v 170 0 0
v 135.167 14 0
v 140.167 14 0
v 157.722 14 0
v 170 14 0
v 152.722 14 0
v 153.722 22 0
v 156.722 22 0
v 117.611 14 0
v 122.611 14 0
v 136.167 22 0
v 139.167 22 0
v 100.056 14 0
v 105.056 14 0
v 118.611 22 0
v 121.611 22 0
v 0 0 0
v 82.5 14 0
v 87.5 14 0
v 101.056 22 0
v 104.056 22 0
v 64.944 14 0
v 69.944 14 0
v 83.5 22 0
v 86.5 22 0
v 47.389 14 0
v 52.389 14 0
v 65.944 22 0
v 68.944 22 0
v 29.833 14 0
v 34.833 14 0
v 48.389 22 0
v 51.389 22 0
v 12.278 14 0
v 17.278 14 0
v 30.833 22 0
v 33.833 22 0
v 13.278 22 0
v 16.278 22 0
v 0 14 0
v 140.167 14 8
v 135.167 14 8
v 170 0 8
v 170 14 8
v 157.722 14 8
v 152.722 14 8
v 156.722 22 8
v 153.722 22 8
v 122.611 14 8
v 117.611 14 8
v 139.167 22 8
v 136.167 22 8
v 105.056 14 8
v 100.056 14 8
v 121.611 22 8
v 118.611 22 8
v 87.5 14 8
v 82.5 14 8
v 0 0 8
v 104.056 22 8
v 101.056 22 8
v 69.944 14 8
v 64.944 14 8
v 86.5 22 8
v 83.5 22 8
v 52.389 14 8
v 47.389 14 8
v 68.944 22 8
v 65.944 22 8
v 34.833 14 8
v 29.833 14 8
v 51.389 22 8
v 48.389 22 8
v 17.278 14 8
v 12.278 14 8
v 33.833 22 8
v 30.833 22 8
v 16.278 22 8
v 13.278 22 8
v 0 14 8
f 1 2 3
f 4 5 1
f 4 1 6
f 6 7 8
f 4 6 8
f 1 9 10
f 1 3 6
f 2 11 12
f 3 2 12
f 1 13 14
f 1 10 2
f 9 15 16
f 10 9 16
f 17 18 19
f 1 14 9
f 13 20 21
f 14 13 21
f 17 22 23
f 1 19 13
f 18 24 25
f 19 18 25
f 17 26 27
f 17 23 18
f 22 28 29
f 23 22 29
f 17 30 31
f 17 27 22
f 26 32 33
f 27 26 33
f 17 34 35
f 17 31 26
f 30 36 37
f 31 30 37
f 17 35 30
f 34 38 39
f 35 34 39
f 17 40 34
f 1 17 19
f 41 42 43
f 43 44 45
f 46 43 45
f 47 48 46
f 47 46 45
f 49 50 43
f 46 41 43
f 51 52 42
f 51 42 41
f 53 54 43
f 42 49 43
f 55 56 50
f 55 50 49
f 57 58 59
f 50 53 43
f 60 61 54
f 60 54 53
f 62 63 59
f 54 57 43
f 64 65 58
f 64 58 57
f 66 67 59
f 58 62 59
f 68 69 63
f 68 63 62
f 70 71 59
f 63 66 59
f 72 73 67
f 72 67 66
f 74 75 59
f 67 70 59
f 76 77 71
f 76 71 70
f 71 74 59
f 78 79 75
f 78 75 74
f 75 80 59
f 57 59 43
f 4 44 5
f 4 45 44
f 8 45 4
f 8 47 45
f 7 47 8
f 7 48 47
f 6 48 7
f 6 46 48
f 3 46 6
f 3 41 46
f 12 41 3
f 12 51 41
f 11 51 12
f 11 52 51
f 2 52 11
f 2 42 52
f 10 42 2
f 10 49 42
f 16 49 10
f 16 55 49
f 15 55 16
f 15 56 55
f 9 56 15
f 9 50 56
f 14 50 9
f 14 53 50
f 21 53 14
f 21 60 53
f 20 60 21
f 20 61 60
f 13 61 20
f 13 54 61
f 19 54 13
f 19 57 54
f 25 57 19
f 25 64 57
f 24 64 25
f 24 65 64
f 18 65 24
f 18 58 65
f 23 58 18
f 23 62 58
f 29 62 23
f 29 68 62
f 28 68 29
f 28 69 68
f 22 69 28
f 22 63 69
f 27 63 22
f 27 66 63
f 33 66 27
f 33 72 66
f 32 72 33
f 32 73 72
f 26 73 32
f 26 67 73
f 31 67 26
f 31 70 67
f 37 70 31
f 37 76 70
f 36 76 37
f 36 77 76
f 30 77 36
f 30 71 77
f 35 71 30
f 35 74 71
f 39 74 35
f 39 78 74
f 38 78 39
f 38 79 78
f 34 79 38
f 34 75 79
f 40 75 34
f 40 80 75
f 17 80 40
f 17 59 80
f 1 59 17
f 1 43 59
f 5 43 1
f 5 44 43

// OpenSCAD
$fn = 32;

// ----------------------------------------------------------------------
// Gear rack: 9 teeth on a 170 mm bar, pitch 17.56 mm
// ----------------------------------------------------------------------

// --- parameters (mm) ---
profile_height = 8;       // extrusion height
profile_points = 40;      // points of the closed outline

profile = [[0, 0], [170, 0], [170, 14], [157.722, 14], [156.722, 22], [153.722, 22], [152.722, 14], [140.167, 14], [139.167, 22], [136.167, 22], [135.167, 14], [122.611, 14], [121.611, 22], [118.611, 22], [117.611, 14], [105.056, 14], [104.056, 22], [101.056, 22], [100.056, 14], [87.5, 14], [86.5, 22], [83.5, 22], [82.5, 14], [69.944, 14], [68.944, 22], [65.944, 22], [64.944, 14], [52.389, 14], [51.389, 22], [48.389, 22], [47.389, 14], [34.833, 14], [33.833, 22], [30.833, 22], [29.833, 14], [17.278, 14], [16.278, 22], [13.278, 22], [12.278, 14], [0, 14]];  // single closed polygon, 40 points, counter clockwise

// --- the one profile operation ---
linear_extrude(height = profile_height) polygon(points = profile);
